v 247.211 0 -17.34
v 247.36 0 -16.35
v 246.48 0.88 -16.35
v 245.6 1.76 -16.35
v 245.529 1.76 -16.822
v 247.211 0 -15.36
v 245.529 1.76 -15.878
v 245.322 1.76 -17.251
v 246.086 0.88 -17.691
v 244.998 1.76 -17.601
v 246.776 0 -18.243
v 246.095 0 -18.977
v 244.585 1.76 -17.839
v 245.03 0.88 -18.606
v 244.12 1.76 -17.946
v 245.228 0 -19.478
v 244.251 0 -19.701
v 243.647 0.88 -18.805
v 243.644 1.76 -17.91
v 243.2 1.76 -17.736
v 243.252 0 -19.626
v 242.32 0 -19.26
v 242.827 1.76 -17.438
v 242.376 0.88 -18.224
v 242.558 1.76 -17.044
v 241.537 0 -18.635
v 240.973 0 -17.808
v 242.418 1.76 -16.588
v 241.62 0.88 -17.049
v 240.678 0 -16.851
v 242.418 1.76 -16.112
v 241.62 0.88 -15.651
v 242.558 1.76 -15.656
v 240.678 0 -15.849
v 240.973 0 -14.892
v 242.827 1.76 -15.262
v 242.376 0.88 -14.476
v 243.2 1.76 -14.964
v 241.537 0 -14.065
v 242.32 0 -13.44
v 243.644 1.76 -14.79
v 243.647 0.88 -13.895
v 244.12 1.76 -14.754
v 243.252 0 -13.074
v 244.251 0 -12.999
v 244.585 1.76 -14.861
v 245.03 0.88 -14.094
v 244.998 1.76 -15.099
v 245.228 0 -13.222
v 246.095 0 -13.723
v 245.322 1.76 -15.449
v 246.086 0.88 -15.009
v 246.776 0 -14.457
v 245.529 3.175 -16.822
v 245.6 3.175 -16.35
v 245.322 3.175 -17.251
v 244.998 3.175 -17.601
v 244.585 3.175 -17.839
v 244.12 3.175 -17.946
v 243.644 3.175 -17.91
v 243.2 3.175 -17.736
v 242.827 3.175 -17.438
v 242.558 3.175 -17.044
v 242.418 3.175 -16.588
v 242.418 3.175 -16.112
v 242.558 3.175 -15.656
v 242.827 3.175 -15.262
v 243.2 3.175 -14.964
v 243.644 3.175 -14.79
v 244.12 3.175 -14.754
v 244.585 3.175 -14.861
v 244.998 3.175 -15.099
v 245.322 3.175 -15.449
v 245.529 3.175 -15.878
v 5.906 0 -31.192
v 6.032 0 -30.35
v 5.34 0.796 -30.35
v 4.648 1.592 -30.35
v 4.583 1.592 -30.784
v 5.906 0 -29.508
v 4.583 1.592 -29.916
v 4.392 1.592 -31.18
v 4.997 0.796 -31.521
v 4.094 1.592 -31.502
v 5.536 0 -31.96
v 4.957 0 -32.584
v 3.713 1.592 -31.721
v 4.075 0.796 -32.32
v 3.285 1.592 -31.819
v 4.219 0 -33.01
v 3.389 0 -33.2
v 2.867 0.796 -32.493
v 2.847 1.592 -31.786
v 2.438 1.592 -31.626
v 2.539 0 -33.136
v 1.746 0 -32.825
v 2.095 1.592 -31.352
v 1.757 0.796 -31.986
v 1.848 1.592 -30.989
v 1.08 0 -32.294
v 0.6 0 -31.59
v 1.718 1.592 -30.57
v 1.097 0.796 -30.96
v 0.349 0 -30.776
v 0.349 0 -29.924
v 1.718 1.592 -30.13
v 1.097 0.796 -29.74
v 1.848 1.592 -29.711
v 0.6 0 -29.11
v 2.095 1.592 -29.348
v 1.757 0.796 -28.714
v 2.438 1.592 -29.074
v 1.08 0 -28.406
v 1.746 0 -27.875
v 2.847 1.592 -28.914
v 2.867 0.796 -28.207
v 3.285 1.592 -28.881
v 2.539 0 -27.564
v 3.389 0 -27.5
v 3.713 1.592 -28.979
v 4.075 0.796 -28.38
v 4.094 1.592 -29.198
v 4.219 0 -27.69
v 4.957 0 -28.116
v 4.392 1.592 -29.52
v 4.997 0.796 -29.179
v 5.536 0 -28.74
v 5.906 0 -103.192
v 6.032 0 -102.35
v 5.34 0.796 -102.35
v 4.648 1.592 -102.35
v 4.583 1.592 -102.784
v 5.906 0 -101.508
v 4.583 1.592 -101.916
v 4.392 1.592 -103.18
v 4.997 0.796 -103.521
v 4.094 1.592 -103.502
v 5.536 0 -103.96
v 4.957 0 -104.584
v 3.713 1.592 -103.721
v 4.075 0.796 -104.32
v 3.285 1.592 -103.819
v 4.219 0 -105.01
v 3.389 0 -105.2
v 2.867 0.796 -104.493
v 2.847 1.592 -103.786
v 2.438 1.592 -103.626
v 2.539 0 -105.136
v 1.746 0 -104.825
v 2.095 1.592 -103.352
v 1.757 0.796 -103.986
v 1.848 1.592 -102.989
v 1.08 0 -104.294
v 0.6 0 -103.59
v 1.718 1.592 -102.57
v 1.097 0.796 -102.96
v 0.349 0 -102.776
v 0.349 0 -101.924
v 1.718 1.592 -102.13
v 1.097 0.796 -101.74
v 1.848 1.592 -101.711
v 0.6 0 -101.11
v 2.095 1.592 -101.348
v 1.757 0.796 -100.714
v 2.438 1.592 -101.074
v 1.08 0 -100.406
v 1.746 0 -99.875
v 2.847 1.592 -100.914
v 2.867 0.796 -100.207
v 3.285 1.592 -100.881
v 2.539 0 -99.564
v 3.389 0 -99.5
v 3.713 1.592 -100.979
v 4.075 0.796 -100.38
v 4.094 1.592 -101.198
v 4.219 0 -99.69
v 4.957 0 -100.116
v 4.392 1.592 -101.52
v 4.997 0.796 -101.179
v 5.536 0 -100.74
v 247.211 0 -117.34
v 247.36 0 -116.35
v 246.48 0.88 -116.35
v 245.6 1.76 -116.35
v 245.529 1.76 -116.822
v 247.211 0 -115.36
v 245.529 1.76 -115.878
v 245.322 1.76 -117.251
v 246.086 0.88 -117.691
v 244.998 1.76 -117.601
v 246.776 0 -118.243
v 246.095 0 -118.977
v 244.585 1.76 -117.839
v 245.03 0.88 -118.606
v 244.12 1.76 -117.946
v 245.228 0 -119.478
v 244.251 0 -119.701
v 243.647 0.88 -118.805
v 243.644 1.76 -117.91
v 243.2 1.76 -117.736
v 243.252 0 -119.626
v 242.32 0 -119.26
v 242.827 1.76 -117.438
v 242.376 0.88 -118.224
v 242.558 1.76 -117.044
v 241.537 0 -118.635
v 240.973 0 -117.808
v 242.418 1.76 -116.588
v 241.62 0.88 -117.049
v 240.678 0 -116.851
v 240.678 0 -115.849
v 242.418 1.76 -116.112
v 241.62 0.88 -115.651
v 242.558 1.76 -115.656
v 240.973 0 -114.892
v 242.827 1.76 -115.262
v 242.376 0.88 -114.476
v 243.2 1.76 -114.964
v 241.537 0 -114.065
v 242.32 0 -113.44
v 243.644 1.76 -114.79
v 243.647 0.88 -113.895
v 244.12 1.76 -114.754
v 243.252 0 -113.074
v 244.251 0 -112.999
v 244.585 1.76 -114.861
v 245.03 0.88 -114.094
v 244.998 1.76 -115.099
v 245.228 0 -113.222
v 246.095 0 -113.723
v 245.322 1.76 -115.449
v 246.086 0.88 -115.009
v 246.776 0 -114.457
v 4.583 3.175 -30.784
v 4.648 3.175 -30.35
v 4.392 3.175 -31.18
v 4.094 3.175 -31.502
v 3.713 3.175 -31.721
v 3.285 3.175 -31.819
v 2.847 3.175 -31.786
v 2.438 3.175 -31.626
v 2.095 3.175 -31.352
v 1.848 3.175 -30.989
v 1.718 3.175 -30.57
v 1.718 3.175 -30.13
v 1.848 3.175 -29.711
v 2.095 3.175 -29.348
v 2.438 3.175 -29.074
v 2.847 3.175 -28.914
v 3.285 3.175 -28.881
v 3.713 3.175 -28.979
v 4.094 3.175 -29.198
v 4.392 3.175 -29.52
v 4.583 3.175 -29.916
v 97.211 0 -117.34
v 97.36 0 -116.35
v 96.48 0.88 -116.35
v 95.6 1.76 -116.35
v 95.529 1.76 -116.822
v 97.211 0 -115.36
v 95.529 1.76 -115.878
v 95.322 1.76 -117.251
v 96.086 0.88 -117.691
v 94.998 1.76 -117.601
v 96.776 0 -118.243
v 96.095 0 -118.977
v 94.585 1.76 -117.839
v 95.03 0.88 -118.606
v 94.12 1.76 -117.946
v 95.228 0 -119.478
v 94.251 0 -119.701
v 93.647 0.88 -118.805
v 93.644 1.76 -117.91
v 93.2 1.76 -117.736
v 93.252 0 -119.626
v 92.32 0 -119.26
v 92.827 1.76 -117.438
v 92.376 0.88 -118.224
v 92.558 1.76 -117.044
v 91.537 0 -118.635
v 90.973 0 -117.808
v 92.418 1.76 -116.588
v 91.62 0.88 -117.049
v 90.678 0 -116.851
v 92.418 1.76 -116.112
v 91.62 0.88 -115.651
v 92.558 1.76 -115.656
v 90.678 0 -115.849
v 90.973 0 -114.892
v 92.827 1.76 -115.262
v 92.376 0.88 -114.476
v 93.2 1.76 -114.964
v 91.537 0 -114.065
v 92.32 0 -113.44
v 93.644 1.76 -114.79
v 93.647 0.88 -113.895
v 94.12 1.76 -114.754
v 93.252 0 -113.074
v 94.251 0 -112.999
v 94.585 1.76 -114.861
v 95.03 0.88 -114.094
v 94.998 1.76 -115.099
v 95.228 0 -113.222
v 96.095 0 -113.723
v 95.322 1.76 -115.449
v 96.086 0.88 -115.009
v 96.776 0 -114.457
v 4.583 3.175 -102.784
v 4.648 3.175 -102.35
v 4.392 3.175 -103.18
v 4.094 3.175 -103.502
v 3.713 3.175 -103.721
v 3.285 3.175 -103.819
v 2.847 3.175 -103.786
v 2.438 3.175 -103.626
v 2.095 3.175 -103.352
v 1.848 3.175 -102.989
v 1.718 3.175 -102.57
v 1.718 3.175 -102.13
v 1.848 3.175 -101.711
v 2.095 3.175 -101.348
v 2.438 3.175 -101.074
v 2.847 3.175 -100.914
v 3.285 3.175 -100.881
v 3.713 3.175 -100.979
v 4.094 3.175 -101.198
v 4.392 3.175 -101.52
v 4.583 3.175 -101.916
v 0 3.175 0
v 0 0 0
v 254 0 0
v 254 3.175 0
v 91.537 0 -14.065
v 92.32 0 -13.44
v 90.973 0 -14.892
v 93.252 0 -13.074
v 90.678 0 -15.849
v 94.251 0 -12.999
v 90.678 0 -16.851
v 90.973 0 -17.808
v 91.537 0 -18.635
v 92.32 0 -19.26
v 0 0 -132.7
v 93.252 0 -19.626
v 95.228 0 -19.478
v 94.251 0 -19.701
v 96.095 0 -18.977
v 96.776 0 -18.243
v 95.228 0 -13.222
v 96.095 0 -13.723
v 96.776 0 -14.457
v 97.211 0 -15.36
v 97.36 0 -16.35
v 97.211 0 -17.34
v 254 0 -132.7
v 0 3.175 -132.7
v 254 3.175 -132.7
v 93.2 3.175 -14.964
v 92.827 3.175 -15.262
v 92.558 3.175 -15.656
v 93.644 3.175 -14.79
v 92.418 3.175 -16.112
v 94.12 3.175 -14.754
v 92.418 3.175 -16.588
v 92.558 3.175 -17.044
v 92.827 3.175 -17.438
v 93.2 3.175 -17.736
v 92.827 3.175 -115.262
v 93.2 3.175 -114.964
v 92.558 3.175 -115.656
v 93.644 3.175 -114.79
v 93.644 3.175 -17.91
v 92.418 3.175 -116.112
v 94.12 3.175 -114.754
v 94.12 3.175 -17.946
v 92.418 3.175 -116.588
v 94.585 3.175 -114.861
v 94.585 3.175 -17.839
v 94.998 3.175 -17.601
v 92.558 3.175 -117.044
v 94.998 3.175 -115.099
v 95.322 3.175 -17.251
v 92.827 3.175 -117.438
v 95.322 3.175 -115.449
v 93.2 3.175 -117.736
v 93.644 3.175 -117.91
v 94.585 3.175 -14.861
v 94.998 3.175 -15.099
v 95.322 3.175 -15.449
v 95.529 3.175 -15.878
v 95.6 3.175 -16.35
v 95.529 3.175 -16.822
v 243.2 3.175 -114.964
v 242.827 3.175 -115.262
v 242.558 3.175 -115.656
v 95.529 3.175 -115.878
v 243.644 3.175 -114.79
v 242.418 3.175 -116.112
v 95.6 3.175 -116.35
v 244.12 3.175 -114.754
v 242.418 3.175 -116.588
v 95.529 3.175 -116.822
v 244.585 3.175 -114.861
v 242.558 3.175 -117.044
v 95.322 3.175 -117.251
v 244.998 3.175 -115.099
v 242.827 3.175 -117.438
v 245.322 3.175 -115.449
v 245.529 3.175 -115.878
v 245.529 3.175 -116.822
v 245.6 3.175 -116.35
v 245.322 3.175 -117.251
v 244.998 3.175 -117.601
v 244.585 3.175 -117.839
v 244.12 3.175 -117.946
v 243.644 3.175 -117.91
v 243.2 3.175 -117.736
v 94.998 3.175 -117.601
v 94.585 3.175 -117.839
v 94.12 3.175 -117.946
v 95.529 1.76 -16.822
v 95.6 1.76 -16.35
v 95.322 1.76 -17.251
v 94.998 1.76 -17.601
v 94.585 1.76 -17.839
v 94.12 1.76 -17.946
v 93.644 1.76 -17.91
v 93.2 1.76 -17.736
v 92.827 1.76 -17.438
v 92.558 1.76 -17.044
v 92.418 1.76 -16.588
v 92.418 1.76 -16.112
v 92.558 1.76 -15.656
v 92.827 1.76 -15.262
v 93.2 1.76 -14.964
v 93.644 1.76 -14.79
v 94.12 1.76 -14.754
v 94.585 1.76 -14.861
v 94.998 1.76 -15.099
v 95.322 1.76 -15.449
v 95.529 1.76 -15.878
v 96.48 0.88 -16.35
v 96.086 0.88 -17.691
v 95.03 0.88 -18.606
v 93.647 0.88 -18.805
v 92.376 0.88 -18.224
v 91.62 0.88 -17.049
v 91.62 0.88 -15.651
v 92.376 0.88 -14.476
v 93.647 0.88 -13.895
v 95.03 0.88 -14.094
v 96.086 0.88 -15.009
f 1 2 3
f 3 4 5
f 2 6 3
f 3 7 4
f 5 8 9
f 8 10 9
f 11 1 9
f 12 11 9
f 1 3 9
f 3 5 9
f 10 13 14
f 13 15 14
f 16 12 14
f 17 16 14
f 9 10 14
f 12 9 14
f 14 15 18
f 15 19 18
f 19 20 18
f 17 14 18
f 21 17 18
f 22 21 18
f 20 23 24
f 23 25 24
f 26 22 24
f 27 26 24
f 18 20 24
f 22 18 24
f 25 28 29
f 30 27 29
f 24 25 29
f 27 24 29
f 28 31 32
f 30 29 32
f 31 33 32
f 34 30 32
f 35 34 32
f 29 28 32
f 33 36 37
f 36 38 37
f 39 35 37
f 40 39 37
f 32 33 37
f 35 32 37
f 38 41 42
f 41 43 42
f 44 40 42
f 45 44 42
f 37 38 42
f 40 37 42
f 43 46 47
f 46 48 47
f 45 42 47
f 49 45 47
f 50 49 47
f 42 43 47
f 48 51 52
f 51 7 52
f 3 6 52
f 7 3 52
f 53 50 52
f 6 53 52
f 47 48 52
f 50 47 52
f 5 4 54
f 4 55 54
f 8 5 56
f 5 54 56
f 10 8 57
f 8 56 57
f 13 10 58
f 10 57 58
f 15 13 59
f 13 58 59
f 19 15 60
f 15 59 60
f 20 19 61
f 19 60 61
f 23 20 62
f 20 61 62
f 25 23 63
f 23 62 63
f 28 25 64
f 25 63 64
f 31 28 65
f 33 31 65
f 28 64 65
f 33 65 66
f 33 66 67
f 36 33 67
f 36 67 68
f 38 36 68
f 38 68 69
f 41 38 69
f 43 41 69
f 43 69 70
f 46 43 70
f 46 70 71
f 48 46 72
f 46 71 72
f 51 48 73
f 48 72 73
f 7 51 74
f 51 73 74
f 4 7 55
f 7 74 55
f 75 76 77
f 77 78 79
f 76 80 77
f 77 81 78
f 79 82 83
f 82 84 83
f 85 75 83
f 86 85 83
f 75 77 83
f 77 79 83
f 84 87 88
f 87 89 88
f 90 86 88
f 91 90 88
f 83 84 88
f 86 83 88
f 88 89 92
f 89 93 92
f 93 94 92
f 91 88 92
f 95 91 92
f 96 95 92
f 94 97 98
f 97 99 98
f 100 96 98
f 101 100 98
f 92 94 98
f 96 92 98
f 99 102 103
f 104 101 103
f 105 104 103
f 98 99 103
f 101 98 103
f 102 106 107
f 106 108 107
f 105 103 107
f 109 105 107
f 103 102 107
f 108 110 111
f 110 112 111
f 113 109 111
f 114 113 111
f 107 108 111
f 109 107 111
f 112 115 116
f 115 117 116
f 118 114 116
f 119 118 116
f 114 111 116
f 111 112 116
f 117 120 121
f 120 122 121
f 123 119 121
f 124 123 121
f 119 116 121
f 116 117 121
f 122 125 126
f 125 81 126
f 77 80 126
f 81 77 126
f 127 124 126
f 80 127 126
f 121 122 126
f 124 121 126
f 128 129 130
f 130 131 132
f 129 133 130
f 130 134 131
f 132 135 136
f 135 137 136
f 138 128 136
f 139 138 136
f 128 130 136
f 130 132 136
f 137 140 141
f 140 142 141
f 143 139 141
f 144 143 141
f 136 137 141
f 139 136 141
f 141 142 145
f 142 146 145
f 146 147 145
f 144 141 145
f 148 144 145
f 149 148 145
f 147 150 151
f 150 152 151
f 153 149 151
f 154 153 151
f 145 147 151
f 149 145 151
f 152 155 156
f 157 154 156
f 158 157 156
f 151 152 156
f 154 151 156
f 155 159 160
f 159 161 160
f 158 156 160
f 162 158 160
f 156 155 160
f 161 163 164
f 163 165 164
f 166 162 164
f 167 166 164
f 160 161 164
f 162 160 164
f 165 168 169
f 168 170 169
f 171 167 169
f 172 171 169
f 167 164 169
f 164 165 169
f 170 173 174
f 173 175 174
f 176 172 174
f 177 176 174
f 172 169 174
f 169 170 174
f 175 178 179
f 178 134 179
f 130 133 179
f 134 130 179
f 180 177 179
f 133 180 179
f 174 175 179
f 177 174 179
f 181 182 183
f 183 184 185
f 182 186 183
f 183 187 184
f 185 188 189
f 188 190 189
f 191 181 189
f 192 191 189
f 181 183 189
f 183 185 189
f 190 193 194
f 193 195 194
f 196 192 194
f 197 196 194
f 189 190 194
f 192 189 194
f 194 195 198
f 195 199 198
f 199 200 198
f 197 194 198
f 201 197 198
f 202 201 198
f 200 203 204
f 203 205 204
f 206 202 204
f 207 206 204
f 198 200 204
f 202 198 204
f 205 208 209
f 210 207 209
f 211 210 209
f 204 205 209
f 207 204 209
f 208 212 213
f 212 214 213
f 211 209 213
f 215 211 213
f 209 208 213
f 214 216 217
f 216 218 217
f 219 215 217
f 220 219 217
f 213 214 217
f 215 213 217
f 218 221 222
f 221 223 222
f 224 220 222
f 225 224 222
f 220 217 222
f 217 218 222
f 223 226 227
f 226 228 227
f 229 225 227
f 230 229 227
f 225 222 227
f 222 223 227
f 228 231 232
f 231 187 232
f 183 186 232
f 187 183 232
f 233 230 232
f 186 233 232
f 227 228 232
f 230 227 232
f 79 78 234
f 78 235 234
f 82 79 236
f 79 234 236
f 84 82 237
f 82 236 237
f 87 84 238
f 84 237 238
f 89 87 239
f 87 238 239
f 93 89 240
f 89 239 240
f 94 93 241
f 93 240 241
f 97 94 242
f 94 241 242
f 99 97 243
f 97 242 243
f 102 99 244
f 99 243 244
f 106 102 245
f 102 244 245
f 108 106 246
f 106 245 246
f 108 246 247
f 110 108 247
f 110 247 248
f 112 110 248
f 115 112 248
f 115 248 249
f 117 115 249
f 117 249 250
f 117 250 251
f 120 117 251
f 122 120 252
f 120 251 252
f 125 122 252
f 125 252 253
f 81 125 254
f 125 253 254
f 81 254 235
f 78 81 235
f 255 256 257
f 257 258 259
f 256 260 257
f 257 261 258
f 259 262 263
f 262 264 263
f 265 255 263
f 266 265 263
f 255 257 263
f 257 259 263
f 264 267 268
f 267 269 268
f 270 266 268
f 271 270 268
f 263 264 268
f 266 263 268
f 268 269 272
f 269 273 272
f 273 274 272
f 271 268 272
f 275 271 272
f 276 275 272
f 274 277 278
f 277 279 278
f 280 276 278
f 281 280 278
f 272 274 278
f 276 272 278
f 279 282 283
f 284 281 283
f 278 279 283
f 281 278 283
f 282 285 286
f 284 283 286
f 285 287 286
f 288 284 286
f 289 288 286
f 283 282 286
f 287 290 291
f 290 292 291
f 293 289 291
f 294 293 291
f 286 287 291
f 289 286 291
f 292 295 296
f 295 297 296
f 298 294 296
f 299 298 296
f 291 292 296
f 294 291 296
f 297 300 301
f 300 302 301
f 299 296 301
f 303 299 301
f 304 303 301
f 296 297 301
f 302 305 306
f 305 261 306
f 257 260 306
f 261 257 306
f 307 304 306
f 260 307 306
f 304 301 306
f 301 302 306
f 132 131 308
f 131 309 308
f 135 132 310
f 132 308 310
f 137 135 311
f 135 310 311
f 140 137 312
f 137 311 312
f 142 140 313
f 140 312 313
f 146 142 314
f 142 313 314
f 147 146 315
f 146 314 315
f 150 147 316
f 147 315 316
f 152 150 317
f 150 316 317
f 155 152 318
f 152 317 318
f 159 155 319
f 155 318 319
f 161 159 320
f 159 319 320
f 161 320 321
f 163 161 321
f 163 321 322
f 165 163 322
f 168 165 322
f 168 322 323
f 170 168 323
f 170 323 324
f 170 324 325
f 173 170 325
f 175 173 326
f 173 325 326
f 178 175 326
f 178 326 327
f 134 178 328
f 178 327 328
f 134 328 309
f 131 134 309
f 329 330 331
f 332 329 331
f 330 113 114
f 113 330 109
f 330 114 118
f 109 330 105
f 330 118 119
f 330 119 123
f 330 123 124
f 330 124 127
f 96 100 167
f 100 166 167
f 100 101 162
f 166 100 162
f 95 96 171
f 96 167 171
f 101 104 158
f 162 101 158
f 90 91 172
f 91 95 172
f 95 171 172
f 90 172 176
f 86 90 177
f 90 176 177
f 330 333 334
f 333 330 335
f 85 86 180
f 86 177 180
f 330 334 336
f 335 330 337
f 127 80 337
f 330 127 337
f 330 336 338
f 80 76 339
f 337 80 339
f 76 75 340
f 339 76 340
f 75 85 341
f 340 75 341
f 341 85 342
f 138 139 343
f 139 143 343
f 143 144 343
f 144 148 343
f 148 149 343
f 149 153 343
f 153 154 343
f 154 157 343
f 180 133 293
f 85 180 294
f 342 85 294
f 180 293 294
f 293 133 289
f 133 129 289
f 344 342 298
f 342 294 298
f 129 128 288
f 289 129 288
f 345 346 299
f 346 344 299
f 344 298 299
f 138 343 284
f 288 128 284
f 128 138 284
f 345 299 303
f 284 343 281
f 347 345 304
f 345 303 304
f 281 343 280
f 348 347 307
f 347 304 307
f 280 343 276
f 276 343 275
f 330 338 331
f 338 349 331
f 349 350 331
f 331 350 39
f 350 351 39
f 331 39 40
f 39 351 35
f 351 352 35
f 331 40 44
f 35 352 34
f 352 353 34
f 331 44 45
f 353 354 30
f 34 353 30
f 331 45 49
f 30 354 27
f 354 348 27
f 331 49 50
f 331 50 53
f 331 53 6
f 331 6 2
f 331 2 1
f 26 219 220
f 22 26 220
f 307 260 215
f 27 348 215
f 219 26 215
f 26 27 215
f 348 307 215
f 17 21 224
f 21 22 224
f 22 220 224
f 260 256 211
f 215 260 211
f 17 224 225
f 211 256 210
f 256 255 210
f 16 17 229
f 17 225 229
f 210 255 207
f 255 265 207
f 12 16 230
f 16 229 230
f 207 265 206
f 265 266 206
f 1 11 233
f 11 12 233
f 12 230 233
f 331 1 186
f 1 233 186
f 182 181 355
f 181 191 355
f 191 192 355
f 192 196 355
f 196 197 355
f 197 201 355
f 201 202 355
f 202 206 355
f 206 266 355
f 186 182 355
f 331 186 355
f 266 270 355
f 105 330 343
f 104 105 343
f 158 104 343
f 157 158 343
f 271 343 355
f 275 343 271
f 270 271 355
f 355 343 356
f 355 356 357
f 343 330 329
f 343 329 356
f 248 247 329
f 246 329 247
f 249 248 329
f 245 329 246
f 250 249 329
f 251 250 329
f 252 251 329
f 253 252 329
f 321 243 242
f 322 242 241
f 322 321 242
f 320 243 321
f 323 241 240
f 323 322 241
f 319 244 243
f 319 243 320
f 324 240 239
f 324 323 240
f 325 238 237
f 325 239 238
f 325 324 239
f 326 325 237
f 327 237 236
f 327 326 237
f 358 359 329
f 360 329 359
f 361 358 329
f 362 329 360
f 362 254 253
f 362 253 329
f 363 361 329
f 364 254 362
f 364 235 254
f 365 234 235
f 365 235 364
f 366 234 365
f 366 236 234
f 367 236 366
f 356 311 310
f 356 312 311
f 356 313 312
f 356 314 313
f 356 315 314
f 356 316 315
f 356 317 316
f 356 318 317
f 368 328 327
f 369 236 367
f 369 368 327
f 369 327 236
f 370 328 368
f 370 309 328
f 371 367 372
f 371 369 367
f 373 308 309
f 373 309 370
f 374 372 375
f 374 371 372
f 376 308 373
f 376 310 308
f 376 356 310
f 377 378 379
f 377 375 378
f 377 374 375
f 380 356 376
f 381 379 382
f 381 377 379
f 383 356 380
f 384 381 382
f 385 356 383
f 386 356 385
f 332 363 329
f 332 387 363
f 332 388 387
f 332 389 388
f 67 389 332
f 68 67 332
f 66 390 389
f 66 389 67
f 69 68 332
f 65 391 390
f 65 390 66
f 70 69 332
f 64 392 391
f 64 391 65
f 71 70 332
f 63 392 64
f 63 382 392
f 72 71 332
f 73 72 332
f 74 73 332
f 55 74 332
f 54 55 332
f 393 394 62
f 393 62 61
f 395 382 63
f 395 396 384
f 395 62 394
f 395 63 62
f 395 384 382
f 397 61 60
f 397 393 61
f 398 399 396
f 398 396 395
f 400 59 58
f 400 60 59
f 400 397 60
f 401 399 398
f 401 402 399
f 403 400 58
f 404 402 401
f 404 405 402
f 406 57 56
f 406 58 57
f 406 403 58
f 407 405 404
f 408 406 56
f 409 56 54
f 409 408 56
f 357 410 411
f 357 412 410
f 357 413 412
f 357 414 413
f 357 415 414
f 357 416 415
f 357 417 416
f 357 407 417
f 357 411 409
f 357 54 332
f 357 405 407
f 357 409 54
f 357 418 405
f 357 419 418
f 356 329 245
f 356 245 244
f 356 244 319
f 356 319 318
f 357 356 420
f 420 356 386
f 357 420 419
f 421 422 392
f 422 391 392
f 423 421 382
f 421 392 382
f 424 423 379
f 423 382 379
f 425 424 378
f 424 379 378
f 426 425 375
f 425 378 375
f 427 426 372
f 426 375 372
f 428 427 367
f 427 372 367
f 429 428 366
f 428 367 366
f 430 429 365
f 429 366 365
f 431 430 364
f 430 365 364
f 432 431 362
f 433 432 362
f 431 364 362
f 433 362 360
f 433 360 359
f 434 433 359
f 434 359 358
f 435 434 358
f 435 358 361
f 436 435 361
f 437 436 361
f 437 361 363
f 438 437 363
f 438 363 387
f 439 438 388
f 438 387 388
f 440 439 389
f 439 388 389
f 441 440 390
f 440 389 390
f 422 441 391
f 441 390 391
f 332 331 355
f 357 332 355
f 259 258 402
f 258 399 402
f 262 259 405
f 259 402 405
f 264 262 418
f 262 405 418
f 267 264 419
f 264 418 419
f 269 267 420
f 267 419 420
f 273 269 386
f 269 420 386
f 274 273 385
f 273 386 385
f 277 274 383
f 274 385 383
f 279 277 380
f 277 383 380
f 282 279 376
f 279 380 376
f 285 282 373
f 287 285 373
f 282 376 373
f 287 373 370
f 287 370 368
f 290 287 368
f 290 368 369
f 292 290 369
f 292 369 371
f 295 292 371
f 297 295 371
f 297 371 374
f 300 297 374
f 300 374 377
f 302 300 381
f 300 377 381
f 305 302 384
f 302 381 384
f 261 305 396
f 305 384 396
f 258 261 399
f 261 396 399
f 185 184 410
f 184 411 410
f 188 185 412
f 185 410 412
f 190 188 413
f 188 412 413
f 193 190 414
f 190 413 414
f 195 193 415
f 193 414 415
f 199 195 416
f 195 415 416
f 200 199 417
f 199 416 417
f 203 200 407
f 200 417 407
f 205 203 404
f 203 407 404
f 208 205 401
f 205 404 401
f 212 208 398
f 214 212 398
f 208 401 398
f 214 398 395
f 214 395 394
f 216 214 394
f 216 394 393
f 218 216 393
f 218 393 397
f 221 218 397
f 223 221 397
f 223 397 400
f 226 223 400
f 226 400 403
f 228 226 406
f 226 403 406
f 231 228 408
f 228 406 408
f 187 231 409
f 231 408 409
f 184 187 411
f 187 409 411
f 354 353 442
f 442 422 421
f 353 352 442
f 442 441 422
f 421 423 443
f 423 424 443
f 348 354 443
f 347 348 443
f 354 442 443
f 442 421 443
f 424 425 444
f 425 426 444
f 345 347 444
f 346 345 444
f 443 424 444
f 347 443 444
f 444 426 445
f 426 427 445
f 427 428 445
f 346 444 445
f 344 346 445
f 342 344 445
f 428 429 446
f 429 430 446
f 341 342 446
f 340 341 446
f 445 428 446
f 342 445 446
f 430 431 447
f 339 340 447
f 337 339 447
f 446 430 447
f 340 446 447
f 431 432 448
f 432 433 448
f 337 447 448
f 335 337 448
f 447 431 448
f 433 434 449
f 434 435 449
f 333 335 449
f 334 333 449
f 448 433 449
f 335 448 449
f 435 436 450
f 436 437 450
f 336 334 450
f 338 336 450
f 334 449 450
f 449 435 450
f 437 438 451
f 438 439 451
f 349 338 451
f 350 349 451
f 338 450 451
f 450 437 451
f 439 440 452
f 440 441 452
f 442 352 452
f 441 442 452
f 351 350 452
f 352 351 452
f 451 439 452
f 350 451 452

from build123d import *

# Parameters (mm, degrees)
SKETCH1_W                                      = 254
SKETCH1_H                                      = 132.70000003
BOSS_EXTRUDE1_DEPTH                            = 3.175
CSK_FOR_M3_SFHCS1_D                            = 3.2
CSK_FOR_M3_SFHCS1_DEPTH                        = 10.9728
CSK_FOR_M3_SFHCS1_CSINK_D                      = 6.72
CSK_FOR_M3_SFHCS1_CSINK_ANGLE                  = 90
CSK_FOR_M3_SFHCS1_TIP                          = 0.96137699
CSK_FOR_4_FLAT_HEAD_MACHINE_SCREW1_D           = 2.9464
CSK_FOR_4_FLAT_HEAD_MACHINE_SCREW1_DEPTH       = 10.9728
CSK_FOR_4_FLAT_HEAD_MACHINE_SCREW1_CSINK_D     = 5.715
CSK_FOR_4_FLAT_HEAD_MACHINE_SCREW1_CSINK_ANGLE = 82
CSK_FOR_4_FLAT_HEAD_MACHINE_SCREW1_TIP         = 0.885187864


with BuildPart() as part:
    # Sketch1 → Boss-Extrude1 (new body)
    with BuildSketch(Plane(origin=(0, 0, 0), x_dir=(1, 0, 0), z_dir=(0, 1, 0))):
        with Locations((127, 66.350000015)):
            Rectangle(SKETCH1_W, SKETCH1_H)
    extrude(amount=BOSS_EXTRUDE1_DEPTH)

    # CSK for M3 SFHCS1
    with Locations(Plane(origin=(0, 0, 0), x_dir=(-1, 0, 0), z_dir=(0, -1, 0))):
        with Locations((-244, 116.350000015), (-94, 116.350000015), (-94, 16.350000015), (-244, 16.350000015)):
            CounterSinkHole(CSK_FOR_M3_SFHCS1_D / 2, CSK_FOR_M3_SFHCS1_CSINK_D / 2, depth=CSK_FOR_M3_SFHCS1_DEPTH, counter_sink_angle=CSK_FOR_M3_SFHCS1_CSINK_ANGLE)
            with Locations((0, 0, -(CSK_FOR_M3_SFHCS1_DEPTH + CSK_FOR_M3_SFHCS1_TIP / 2))):  # 118° drill point
                Cone(0, CSK_FOR_M3_SFHCS1_D / 2, CSK_FOR_M3_SFHCS1_TIP, mode=Mode.SUBTRACT)

    # CSK for #4 Flat Head Machine Screw1
    with Locations(Plane(origin=(0, 0, 0), x_dir=(-1, 0, 0), z_dir=(0, -1, 0))):
        with Locations((-3.175, 102.350000024), (-3.175, 30.350000006)):
            CounterSinkHole(CSK_FOR_4_FLAT_HEAD_MACHINE_SCREW1_D / 2, CSK_FOR_4_FLAT_HEAD_MACHINE_SCREW1_CSINK_D / 2, depth=CSK_FOR_4_FLAT_HEAD_MACHINE_SCREW1_DEPTH, counter_sink_angle=CSK_FOR_4_FLAT_HEAD_MACHINE_SCREW1_CSINK_ANGLE)
            with Locations((0, 0, -(CSK_FOR_4_FLAT_HEAD_MACHINE_SCREW1_DEPTH + CSK_FOR_4_FLAT_HEAD_MACHINE_SCREW1_TIP / 2))):  # 118° drill point
                Cone(0, CSK_FOR_4_FLAT_HEAD_MACHINE_SCREW1_D / 2, CSK_FOR_4_FLAT_HEAD_MACHINE_SCREW1_TIP, mode=Mode.SUBTRACT)


solid = part.part
